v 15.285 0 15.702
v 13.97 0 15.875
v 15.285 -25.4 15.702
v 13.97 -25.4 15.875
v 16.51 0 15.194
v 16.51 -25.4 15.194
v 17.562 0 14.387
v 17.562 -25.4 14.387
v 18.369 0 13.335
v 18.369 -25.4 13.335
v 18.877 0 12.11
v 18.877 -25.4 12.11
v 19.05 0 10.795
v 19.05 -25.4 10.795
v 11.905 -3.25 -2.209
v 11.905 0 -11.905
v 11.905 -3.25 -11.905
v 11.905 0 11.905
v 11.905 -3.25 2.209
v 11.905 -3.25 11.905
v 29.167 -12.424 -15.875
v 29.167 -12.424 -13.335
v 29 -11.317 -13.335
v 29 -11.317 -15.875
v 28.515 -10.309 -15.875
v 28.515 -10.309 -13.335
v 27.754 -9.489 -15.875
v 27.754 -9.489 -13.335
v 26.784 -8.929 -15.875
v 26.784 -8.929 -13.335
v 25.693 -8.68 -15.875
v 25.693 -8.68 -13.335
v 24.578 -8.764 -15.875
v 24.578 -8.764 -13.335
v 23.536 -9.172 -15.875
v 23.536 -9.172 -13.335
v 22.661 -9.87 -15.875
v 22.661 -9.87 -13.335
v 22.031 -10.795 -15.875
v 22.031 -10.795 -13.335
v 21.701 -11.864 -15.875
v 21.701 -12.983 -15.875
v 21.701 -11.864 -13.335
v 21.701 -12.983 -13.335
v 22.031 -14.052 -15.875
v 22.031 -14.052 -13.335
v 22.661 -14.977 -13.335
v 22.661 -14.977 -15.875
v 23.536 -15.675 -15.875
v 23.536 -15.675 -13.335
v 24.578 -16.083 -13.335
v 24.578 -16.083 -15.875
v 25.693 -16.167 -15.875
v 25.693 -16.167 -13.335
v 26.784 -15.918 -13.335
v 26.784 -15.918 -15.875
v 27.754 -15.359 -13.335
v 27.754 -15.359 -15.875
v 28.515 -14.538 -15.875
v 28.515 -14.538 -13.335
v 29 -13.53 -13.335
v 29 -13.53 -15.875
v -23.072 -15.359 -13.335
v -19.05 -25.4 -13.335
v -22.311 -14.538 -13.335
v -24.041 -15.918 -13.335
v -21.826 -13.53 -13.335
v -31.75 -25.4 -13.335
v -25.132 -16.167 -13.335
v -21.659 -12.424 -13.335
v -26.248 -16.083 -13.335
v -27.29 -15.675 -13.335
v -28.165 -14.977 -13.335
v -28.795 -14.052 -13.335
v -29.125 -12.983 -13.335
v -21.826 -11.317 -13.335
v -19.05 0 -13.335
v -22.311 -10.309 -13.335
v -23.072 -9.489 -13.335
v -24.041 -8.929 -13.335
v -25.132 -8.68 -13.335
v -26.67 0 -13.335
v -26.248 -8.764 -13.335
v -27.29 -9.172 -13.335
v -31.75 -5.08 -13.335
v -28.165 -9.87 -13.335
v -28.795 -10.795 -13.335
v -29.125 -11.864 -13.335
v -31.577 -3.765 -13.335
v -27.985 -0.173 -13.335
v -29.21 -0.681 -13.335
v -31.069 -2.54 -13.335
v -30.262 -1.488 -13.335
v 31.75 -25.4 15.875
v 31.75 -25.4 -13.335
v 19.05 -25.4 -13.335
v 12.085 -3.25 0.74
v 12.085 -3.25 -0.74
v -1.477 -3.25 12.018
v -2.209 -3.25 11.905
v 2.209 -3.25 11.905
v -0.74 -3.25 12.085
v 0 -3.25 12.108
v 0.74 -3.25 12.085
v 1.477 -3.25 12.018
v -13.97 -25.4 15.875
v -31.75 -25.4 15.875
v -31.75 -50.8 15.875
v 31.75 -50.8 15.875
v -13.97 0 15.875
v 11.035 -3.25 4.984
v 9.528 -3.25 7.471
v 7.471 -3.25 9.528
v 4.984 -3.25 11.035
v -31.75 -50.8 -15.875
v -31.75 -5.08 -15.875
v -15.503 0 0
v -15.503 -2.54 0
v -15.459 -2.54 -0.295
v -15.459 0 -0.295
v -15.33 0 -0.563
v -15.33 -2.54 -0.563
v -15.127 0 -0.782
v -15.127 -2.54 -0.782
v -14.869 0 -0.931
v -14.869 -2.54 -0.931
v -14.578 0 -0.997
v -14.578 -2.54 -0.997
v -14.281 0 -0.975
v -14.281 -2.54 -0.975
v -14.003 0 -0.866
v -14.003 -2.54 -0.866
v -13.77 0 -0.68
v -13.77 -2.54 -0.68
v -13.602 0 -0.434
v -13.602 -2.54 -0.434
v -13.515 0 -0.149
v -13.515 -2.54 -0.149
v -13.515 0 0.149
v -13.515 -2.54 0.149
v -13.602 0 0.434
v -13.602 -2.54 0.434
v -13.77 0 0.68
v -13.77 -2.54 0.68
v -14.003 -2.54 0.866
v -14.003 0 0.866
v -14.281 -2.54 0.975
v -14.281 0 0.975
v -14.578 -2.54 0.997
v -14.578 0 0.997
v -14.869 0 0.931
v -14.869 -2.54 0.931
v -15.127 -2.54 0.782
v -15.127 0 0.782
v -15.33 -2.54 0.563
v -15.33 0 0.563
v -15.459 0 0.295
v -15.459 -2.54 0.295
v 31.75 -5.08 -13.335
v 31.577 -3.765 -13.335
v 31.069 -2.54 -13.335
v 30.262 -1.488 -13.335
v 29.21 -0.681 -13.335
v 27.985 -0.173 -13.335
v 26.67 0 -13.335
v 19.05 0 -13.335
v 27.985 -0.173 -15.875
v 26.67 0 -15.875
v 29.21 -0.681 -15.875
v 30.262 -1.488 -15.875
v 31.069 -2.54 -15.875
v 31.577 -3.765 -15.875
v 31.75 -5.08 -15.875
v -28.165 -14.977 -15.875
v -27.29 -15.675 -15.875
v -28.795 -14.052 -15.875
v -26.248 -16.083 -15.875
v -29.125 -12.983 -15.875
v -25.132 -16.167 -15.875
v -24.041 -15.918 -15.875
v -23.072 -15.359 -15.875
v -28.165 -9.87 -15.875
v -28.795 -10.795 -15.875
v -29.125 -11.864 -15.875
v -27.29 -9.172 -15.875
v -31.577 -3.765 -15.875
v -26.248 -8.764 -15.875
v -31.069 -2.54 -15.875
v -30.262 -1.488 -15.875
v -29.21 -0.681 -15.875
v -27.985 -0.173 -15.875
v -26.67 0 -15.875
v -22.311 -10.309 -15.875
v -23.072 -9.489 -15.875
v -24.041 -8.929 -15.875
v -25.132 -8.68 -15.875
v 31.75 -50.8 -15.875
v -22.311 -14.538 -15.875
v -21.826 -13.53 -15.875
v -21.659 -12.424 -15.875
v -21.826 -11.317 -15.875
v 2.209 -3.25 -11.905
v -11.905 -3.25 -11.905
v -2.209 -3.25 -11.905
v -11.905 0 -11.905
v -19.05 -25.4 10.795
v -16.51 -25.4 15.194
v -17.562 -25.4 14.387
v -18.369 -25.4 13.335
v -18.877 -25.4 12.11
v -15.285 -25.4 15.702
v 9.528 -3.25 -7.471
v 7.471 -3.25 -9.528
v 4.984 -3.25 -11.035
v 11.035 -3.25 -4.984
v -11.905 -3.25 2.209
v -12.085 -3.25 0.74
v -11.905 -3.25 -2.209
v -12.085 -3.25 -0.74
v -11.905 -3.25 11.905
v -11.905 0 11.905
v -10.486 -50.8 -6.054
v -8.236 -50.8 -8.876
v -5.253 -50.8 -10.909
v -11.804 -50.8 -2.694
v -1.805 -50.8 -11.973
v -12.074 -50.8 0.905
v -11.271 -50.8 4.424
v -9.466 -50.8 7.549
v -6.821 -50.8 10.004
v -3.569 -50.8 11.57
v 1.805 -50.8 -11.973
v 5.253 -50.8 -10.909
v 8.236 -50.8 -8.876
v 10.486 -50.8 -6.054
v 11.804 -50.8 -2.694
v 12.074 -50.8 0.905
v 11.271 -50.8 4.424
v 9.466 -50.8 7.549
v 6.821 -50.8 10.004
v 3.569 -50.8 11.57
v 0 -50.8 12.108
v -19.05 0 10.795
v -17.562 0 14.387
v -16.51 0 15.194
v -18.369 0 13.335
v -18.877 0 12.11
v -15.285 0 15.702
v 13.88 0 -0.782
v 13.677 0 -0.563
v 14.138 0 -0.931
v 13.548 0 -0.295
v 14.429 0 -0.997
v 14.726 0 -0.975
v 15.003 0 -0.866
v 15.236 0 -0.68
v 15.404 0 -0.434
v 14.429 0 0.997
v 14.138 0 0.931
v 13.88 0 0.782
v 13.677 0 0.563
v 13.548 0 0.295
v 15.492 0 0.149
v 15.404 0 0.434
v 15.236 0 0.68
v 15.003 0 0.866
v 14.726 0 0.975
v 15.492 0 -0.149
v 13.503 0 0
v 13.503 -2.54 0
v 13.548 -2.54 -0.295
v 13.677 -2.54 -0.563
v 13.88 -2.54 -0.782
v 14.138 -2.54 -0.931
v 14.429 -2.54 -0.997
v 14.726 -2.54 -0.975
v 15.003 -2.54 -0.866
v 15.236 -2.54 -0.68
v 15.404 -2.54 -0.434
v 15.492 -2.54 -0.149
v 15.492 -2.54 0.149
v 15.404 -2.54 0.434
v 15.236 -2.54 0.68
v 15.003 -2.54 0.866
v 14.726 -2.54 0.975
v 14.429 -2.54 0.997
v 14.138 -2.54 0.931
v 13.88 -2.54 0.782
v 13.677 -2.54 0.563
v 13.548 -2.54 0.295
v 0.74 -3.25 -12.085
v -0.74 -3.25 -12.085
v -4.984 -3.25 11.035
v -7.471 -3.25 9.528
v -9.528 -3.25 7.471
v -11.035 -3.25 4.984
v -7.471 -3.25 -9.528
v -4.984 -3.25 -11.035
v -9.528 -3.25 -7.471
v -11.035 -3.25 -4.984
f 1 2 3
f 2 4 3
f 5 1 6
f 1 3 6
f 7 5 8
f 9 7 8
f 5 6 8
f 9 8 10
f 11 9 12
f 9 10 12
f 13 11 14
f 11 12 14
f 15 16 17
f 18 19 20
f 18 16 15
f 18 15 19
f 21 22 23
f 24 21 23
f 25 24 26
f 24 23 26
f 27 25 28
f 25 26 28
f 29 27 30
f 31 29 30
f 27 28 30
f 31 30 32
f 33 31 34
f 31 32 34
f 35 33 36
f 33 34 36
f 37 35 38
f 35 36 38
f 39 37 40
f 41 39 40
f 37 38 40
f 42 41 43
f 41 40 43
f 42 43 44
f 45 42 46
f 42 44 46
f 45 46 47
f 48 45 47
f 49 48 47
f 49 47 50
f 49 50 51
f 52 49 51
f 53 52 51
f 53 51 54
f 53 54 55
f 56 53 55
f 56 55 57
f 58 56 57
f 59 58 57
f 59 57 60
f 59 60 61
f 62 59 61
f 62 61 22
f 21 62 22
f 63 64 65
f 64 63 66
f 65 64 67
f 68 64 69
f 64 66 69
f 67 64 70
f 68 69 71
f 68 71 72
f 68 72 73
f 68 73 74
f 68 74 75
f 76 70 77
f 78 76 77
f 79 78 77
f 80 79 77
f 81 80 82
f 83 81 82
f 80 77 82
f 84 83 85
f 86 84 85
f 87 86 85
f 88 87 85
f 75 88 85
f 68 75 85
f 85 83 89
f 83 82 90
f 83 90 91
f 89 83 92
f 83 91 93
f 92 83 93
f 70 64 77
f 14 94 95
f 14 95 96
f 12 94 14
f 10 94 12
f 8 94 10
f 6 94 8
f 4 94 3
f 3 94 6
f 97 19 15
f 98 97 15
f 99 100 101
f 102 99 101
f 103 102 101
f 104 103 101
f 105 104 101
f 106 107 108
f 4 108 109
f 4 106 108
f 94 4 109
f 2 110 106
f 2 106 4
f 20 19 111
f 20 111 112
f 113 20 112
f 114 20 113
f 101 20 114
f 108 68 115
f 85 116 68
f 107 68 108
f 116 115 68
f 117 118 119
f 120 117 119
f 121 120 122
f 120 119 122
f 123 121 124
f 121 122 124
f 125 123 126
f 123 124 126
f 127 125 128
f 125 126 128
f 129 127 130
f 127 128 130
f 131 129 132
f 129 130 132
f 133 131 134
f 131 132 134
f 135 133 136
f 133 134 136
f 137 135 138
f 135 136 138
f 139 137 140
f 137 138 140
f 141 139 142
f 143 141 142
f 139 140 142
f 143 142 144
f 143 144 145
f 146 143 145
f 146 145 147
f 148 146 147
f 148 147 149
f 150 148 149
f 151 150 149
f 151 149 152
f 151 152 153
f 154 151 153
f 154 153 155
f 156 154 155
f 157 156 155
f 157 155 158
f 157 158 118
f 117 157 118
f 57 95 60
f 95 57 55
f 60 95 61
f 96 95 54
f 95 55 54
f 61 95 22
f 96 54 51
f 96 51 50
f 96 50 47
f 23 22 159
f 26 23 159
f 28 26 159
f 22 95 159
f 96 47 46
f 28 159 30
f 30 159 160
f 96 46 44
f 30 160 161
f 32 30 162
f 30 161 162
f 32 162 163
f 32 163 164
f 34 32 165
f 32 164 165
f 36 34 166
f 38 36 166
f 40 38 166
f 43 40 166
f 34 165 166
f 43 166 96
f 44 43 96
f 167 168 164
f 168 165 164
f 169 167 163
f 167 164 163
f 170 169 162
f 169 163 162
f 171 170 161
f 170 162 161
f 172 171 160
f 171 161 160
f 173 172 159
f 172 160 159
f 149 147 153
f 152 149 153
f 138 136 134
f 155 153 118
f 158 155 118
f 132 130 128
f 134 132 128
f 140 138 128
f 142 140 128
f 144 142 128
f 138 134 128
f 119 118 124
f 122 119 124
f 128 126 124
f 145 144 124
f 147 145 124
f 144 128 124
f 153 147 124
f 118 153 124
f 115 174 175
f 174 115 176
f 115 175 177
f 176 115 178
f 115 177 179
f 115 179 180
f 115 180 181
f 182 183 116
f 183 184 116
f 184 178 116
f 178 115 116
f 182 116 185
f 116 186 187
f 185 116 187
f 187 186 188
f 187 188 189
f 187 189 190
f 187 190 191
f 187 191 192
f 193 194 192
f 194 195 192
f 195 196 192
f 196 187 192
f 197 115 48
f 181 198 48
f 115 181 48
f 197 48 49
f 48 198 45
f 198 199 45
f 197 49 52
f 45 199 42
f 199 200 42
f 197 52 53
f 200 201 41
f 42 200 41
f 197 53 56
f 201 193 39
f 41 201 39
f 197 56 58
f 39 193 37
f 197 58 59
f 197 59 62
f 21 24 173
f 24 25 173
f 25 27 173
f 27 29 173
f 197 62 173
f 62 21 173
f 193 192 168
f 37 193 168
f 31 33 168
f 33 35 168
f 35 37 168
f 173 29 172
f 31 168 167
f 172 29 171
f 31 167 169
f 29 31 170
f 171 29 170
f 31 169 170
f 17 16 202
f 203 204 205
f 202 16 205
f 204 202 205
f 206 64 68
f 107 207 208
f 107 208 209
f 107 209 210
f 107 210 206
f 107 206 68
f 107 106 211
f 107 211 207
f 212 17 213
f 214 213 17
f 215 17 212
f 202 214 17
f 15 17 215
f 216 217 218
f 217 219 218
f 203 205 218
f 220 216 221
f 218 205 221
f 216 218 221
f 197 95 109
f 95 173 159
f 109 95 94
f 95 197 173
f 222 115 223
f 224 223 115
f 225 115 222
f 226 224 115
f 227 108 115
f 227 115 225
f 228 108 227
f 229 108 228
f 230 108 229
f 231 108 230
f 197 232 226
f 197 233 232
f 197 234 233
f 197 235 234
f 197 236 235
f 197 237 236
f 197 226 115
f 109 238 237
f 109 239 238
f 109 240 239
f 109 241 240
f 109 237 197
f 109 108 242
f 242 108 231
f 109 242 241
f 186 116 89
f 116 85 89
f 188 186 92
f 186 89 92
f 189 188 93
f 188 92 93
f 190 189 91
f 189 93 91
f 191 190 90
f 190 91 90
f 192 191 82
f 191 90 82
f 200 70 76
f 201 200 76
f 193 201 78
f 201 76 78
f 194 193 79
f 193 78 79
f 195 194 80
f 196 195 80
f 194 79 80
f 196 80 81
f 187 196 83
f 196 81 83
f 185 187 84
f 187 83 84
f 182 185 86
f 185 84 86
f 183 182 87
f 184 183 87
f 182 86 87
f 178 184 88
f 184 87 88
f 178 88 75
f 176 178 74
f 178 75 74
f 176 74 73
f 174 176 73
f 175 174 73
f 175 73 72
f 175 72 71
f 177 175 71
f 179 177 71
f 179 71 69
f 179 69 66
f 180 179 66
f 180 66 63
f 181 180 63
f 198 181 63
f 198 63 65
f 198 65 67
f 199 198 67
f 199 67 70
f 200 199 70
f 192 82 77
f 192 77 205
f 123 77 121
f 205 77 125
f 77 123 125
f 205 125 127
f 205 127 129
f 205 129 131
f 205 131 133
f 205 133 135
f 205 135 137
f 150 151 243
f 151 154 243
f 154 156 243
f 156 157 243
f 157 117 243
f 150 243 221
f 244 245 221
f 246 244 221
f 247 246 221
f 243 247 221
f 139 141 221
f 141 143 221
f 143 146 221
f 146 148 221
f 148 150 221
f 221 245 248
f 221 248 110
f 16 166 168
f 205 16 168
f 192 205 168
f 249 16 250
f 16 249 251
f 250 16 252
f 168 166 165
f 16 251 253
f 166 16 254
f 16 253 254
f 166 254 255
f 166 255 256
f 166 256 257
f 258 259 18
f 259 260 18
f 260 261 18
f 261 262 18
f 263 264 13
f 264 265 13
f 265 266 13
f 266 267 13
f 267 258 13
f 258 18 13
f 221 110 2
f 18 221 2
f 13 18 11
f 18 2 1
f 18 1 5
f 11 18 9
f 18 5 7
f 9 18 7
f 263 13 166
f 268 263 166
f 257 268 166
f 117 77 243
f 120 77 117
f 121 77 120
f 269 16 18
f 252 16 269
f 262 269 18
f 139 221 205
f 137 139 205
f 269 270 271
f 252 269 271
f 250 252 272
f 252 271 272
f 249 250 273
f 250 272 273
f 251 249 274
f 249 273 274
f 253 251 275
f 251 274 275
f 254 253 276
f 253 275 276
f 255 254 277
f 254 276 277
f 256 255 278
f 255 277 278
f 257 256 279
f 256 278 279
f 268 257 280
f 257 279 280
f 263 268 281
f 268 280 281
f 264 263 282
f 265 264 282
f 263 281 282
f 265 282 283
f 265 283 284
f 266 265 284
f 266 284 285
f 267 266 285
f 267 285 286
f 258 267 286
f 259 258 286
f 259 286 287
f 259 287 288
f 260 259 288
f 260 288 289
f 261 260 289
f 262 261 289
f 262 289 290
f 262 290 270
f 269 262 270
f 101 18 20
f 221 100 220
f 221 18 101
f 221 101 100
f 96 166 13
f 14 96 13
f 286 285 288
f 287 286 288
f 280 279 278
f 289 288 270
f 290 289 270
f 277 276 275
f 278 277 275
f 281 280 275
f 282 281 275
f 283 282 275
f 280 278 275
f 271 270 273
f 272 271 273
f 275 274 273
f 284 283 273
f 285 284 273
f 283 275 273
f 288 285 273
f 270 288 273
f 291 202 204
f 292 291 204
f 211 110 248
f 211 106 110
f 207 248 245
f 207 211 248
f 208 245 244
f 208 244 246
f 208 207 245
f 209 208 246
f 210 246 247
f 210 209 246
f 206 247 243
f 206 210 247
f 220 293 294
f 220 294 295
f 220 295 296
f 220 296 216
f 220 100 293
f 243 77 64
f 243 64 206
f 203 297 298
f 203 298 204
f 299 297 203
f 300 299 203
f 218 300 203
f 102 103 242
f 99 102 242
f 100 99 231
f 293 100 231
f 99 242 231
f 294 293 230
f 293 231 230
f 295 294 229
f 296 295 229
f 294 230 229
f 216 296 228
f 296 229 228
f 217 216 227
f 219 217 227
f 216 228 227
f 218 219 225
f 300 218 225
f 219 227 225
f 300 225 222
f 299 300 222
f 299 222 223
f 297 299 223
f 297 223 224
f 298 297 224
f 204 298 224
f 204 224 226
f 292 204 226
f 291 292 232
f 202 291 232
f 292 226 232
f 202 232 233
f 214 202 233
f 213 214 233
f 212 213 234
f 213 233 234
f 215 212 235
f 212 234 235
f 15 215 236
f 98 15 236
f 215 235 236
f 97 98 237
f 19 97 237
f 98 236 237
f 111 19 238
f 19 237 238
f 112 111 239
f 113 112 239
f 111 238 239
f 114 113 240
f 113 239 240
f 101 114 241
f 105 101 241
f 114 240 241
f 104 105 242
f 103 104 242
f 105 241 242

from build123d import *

# Parameters (mm, degrees)
BOSS_EXTRUDE1_START          = -25.4
BOSS_EXTRUDE1_OUTLINE_W      = 63.5
BOSS_EXTRUDE1_OUTLINE_H      = 31.75
BOSS_EXTRUDE1_DEPTH          = 50.8
SKETCH2_W                    = 12.7
SKETCH2_H                    = 29.21
CUT_EXTRUDE1_DEPTH           = 25.4
SKETCH3_W                    = 12.7
SKETCH3_H                    = 29.21
CUT_EXTRUDE2_DEPTH           = 25.4
SKETCH4_W                    = 23.809600622
SKETCH4_H                    = 23.809600622
CUT_EXTRUDE3_DEPTH           = 3.25
SKETCH5_W                    = 12.108
SKETCH5_H                    = 47.55
F_2_0_2_DIAMETER_HOLE1_D     = 2
F_2_0_2_DIAMETER_HOLE1_DEPTH = 2.54
M7_CLEARANCE_HOLE1_D         = 7.508
M7_CLEARANCE_HOLE1_DEPTH     = 31.75
FILLET1_R                    = 5.08


with BuildPart() as part:
    # Boss-Extrude1: read off the stored shape, not the designer's step
    # Boss-Extrude1 outline → Boss-Extrude1 (new body)
    with BuildSketch(Plane.XZ.offset(25.4).offset(BOSS_EXTRUDE1_START)):
        Rectangle(BOSS_EXTRUDE1_OUTLINE_W, BOSS_EXTRUDE1_OUTLINE_H)
    extrude(amount=BOSS_EXTRUDE1_DEPTH)

    # Sketch2 → Cut-Extrude1 (cut)
    with BuildSketch(Plane(origin=(0, 0, 0), x_dir=(-1, 0, 0), z_dir=(0, 1, 0))):
        with Locations((-25.4, 1.27)):
            Rectangle(SKETCH2_W, SKETCH2_H)
    extrude(amount=-CUT_EXTRUDE1_DEPTH, mode=Mode.SUBTRACT)

    # Sketch3 → Cut-Extrude2 (cut)
    with BuildSketch(Plane(origin=(0, 0, 0), x_dir=(-1, 0, 0), z_dir=(0, 1, 0))):
        with Locations((25.4, 1.27)):
            Rectangle(SKETCH3_W, SKETCH3_H)
    extrude(amount=-CUT_EXTRUDE2_DEPTH, mode=Mode.SUBTRACT)

    # Sketch4 → Cut-Extrude3 (cut)
    with BuildSketch(Plane(origin=(0, 0, 0), x_dir=(-1, 0, 0), z_dir=(0, 1, 0))):
        Rectangle(SKETCH4_W, SKETCH4_H)
    extrude(amount=-CUT_EXTRUDE3_DEPTH, mode=Mode.SUBTRACT)

    # Sketch5 → M22 Clearance Hole1 (revolve, cut)
    with BuildSketch(Plane(origin=(0, -3.25, 0), x_dir=(0, 0, 1), z_dir=(1, 0, 0))):
        with Locations((6.054, 23.775)):
            Rectangle(SKETCH5_W, SKETCH5_H)
    revolve(axis=Axis((0, 3.1, 0), (0, -1, 0)), mode=Mode.SUBTRACT)

    # Ø2.0 (2) Diameter Hole1
    with Locations(Plane(origin=(0, 0, 0), x_dir=(1, 0, 0), z_dir=(0, 1, 0))):
        with Locations((14.5034, 0), (-14.5034, 0)):
            Hole(F_2_0_2_DIAMETER_HOLE1_D / 2, depth=F_2_0_2_DIAMETER_HOLE1_DEPTH)

    # M7 Clearance Hole1
    with Locations(Plane(origin=(0, 0, -15.875), x_dir=(-1, 0, 0), z_dir=(0, 0, -1))):
        with Locations((25.412960945, -12.423554609), (-25.412960945, -12.423554609)):
            Hole(M7_CLEARANCE_HOLE1_D / 2, depth=M7_CLEARANCE_HOLE1_DEPTH)

    # Fillet1
    fillet1_edges = [part.edges().sort_by_distance(p)[0] for p in [
        (19.05, -12.7, 15.875),
        (-19.05, -12.7, 15.875),
        (-31.75, 0, -14.605),
        (31.75, 0, -14.605),
    ]]
    fillet(fillet1_edges, radius=FILLET1_R)


solid = part.part
